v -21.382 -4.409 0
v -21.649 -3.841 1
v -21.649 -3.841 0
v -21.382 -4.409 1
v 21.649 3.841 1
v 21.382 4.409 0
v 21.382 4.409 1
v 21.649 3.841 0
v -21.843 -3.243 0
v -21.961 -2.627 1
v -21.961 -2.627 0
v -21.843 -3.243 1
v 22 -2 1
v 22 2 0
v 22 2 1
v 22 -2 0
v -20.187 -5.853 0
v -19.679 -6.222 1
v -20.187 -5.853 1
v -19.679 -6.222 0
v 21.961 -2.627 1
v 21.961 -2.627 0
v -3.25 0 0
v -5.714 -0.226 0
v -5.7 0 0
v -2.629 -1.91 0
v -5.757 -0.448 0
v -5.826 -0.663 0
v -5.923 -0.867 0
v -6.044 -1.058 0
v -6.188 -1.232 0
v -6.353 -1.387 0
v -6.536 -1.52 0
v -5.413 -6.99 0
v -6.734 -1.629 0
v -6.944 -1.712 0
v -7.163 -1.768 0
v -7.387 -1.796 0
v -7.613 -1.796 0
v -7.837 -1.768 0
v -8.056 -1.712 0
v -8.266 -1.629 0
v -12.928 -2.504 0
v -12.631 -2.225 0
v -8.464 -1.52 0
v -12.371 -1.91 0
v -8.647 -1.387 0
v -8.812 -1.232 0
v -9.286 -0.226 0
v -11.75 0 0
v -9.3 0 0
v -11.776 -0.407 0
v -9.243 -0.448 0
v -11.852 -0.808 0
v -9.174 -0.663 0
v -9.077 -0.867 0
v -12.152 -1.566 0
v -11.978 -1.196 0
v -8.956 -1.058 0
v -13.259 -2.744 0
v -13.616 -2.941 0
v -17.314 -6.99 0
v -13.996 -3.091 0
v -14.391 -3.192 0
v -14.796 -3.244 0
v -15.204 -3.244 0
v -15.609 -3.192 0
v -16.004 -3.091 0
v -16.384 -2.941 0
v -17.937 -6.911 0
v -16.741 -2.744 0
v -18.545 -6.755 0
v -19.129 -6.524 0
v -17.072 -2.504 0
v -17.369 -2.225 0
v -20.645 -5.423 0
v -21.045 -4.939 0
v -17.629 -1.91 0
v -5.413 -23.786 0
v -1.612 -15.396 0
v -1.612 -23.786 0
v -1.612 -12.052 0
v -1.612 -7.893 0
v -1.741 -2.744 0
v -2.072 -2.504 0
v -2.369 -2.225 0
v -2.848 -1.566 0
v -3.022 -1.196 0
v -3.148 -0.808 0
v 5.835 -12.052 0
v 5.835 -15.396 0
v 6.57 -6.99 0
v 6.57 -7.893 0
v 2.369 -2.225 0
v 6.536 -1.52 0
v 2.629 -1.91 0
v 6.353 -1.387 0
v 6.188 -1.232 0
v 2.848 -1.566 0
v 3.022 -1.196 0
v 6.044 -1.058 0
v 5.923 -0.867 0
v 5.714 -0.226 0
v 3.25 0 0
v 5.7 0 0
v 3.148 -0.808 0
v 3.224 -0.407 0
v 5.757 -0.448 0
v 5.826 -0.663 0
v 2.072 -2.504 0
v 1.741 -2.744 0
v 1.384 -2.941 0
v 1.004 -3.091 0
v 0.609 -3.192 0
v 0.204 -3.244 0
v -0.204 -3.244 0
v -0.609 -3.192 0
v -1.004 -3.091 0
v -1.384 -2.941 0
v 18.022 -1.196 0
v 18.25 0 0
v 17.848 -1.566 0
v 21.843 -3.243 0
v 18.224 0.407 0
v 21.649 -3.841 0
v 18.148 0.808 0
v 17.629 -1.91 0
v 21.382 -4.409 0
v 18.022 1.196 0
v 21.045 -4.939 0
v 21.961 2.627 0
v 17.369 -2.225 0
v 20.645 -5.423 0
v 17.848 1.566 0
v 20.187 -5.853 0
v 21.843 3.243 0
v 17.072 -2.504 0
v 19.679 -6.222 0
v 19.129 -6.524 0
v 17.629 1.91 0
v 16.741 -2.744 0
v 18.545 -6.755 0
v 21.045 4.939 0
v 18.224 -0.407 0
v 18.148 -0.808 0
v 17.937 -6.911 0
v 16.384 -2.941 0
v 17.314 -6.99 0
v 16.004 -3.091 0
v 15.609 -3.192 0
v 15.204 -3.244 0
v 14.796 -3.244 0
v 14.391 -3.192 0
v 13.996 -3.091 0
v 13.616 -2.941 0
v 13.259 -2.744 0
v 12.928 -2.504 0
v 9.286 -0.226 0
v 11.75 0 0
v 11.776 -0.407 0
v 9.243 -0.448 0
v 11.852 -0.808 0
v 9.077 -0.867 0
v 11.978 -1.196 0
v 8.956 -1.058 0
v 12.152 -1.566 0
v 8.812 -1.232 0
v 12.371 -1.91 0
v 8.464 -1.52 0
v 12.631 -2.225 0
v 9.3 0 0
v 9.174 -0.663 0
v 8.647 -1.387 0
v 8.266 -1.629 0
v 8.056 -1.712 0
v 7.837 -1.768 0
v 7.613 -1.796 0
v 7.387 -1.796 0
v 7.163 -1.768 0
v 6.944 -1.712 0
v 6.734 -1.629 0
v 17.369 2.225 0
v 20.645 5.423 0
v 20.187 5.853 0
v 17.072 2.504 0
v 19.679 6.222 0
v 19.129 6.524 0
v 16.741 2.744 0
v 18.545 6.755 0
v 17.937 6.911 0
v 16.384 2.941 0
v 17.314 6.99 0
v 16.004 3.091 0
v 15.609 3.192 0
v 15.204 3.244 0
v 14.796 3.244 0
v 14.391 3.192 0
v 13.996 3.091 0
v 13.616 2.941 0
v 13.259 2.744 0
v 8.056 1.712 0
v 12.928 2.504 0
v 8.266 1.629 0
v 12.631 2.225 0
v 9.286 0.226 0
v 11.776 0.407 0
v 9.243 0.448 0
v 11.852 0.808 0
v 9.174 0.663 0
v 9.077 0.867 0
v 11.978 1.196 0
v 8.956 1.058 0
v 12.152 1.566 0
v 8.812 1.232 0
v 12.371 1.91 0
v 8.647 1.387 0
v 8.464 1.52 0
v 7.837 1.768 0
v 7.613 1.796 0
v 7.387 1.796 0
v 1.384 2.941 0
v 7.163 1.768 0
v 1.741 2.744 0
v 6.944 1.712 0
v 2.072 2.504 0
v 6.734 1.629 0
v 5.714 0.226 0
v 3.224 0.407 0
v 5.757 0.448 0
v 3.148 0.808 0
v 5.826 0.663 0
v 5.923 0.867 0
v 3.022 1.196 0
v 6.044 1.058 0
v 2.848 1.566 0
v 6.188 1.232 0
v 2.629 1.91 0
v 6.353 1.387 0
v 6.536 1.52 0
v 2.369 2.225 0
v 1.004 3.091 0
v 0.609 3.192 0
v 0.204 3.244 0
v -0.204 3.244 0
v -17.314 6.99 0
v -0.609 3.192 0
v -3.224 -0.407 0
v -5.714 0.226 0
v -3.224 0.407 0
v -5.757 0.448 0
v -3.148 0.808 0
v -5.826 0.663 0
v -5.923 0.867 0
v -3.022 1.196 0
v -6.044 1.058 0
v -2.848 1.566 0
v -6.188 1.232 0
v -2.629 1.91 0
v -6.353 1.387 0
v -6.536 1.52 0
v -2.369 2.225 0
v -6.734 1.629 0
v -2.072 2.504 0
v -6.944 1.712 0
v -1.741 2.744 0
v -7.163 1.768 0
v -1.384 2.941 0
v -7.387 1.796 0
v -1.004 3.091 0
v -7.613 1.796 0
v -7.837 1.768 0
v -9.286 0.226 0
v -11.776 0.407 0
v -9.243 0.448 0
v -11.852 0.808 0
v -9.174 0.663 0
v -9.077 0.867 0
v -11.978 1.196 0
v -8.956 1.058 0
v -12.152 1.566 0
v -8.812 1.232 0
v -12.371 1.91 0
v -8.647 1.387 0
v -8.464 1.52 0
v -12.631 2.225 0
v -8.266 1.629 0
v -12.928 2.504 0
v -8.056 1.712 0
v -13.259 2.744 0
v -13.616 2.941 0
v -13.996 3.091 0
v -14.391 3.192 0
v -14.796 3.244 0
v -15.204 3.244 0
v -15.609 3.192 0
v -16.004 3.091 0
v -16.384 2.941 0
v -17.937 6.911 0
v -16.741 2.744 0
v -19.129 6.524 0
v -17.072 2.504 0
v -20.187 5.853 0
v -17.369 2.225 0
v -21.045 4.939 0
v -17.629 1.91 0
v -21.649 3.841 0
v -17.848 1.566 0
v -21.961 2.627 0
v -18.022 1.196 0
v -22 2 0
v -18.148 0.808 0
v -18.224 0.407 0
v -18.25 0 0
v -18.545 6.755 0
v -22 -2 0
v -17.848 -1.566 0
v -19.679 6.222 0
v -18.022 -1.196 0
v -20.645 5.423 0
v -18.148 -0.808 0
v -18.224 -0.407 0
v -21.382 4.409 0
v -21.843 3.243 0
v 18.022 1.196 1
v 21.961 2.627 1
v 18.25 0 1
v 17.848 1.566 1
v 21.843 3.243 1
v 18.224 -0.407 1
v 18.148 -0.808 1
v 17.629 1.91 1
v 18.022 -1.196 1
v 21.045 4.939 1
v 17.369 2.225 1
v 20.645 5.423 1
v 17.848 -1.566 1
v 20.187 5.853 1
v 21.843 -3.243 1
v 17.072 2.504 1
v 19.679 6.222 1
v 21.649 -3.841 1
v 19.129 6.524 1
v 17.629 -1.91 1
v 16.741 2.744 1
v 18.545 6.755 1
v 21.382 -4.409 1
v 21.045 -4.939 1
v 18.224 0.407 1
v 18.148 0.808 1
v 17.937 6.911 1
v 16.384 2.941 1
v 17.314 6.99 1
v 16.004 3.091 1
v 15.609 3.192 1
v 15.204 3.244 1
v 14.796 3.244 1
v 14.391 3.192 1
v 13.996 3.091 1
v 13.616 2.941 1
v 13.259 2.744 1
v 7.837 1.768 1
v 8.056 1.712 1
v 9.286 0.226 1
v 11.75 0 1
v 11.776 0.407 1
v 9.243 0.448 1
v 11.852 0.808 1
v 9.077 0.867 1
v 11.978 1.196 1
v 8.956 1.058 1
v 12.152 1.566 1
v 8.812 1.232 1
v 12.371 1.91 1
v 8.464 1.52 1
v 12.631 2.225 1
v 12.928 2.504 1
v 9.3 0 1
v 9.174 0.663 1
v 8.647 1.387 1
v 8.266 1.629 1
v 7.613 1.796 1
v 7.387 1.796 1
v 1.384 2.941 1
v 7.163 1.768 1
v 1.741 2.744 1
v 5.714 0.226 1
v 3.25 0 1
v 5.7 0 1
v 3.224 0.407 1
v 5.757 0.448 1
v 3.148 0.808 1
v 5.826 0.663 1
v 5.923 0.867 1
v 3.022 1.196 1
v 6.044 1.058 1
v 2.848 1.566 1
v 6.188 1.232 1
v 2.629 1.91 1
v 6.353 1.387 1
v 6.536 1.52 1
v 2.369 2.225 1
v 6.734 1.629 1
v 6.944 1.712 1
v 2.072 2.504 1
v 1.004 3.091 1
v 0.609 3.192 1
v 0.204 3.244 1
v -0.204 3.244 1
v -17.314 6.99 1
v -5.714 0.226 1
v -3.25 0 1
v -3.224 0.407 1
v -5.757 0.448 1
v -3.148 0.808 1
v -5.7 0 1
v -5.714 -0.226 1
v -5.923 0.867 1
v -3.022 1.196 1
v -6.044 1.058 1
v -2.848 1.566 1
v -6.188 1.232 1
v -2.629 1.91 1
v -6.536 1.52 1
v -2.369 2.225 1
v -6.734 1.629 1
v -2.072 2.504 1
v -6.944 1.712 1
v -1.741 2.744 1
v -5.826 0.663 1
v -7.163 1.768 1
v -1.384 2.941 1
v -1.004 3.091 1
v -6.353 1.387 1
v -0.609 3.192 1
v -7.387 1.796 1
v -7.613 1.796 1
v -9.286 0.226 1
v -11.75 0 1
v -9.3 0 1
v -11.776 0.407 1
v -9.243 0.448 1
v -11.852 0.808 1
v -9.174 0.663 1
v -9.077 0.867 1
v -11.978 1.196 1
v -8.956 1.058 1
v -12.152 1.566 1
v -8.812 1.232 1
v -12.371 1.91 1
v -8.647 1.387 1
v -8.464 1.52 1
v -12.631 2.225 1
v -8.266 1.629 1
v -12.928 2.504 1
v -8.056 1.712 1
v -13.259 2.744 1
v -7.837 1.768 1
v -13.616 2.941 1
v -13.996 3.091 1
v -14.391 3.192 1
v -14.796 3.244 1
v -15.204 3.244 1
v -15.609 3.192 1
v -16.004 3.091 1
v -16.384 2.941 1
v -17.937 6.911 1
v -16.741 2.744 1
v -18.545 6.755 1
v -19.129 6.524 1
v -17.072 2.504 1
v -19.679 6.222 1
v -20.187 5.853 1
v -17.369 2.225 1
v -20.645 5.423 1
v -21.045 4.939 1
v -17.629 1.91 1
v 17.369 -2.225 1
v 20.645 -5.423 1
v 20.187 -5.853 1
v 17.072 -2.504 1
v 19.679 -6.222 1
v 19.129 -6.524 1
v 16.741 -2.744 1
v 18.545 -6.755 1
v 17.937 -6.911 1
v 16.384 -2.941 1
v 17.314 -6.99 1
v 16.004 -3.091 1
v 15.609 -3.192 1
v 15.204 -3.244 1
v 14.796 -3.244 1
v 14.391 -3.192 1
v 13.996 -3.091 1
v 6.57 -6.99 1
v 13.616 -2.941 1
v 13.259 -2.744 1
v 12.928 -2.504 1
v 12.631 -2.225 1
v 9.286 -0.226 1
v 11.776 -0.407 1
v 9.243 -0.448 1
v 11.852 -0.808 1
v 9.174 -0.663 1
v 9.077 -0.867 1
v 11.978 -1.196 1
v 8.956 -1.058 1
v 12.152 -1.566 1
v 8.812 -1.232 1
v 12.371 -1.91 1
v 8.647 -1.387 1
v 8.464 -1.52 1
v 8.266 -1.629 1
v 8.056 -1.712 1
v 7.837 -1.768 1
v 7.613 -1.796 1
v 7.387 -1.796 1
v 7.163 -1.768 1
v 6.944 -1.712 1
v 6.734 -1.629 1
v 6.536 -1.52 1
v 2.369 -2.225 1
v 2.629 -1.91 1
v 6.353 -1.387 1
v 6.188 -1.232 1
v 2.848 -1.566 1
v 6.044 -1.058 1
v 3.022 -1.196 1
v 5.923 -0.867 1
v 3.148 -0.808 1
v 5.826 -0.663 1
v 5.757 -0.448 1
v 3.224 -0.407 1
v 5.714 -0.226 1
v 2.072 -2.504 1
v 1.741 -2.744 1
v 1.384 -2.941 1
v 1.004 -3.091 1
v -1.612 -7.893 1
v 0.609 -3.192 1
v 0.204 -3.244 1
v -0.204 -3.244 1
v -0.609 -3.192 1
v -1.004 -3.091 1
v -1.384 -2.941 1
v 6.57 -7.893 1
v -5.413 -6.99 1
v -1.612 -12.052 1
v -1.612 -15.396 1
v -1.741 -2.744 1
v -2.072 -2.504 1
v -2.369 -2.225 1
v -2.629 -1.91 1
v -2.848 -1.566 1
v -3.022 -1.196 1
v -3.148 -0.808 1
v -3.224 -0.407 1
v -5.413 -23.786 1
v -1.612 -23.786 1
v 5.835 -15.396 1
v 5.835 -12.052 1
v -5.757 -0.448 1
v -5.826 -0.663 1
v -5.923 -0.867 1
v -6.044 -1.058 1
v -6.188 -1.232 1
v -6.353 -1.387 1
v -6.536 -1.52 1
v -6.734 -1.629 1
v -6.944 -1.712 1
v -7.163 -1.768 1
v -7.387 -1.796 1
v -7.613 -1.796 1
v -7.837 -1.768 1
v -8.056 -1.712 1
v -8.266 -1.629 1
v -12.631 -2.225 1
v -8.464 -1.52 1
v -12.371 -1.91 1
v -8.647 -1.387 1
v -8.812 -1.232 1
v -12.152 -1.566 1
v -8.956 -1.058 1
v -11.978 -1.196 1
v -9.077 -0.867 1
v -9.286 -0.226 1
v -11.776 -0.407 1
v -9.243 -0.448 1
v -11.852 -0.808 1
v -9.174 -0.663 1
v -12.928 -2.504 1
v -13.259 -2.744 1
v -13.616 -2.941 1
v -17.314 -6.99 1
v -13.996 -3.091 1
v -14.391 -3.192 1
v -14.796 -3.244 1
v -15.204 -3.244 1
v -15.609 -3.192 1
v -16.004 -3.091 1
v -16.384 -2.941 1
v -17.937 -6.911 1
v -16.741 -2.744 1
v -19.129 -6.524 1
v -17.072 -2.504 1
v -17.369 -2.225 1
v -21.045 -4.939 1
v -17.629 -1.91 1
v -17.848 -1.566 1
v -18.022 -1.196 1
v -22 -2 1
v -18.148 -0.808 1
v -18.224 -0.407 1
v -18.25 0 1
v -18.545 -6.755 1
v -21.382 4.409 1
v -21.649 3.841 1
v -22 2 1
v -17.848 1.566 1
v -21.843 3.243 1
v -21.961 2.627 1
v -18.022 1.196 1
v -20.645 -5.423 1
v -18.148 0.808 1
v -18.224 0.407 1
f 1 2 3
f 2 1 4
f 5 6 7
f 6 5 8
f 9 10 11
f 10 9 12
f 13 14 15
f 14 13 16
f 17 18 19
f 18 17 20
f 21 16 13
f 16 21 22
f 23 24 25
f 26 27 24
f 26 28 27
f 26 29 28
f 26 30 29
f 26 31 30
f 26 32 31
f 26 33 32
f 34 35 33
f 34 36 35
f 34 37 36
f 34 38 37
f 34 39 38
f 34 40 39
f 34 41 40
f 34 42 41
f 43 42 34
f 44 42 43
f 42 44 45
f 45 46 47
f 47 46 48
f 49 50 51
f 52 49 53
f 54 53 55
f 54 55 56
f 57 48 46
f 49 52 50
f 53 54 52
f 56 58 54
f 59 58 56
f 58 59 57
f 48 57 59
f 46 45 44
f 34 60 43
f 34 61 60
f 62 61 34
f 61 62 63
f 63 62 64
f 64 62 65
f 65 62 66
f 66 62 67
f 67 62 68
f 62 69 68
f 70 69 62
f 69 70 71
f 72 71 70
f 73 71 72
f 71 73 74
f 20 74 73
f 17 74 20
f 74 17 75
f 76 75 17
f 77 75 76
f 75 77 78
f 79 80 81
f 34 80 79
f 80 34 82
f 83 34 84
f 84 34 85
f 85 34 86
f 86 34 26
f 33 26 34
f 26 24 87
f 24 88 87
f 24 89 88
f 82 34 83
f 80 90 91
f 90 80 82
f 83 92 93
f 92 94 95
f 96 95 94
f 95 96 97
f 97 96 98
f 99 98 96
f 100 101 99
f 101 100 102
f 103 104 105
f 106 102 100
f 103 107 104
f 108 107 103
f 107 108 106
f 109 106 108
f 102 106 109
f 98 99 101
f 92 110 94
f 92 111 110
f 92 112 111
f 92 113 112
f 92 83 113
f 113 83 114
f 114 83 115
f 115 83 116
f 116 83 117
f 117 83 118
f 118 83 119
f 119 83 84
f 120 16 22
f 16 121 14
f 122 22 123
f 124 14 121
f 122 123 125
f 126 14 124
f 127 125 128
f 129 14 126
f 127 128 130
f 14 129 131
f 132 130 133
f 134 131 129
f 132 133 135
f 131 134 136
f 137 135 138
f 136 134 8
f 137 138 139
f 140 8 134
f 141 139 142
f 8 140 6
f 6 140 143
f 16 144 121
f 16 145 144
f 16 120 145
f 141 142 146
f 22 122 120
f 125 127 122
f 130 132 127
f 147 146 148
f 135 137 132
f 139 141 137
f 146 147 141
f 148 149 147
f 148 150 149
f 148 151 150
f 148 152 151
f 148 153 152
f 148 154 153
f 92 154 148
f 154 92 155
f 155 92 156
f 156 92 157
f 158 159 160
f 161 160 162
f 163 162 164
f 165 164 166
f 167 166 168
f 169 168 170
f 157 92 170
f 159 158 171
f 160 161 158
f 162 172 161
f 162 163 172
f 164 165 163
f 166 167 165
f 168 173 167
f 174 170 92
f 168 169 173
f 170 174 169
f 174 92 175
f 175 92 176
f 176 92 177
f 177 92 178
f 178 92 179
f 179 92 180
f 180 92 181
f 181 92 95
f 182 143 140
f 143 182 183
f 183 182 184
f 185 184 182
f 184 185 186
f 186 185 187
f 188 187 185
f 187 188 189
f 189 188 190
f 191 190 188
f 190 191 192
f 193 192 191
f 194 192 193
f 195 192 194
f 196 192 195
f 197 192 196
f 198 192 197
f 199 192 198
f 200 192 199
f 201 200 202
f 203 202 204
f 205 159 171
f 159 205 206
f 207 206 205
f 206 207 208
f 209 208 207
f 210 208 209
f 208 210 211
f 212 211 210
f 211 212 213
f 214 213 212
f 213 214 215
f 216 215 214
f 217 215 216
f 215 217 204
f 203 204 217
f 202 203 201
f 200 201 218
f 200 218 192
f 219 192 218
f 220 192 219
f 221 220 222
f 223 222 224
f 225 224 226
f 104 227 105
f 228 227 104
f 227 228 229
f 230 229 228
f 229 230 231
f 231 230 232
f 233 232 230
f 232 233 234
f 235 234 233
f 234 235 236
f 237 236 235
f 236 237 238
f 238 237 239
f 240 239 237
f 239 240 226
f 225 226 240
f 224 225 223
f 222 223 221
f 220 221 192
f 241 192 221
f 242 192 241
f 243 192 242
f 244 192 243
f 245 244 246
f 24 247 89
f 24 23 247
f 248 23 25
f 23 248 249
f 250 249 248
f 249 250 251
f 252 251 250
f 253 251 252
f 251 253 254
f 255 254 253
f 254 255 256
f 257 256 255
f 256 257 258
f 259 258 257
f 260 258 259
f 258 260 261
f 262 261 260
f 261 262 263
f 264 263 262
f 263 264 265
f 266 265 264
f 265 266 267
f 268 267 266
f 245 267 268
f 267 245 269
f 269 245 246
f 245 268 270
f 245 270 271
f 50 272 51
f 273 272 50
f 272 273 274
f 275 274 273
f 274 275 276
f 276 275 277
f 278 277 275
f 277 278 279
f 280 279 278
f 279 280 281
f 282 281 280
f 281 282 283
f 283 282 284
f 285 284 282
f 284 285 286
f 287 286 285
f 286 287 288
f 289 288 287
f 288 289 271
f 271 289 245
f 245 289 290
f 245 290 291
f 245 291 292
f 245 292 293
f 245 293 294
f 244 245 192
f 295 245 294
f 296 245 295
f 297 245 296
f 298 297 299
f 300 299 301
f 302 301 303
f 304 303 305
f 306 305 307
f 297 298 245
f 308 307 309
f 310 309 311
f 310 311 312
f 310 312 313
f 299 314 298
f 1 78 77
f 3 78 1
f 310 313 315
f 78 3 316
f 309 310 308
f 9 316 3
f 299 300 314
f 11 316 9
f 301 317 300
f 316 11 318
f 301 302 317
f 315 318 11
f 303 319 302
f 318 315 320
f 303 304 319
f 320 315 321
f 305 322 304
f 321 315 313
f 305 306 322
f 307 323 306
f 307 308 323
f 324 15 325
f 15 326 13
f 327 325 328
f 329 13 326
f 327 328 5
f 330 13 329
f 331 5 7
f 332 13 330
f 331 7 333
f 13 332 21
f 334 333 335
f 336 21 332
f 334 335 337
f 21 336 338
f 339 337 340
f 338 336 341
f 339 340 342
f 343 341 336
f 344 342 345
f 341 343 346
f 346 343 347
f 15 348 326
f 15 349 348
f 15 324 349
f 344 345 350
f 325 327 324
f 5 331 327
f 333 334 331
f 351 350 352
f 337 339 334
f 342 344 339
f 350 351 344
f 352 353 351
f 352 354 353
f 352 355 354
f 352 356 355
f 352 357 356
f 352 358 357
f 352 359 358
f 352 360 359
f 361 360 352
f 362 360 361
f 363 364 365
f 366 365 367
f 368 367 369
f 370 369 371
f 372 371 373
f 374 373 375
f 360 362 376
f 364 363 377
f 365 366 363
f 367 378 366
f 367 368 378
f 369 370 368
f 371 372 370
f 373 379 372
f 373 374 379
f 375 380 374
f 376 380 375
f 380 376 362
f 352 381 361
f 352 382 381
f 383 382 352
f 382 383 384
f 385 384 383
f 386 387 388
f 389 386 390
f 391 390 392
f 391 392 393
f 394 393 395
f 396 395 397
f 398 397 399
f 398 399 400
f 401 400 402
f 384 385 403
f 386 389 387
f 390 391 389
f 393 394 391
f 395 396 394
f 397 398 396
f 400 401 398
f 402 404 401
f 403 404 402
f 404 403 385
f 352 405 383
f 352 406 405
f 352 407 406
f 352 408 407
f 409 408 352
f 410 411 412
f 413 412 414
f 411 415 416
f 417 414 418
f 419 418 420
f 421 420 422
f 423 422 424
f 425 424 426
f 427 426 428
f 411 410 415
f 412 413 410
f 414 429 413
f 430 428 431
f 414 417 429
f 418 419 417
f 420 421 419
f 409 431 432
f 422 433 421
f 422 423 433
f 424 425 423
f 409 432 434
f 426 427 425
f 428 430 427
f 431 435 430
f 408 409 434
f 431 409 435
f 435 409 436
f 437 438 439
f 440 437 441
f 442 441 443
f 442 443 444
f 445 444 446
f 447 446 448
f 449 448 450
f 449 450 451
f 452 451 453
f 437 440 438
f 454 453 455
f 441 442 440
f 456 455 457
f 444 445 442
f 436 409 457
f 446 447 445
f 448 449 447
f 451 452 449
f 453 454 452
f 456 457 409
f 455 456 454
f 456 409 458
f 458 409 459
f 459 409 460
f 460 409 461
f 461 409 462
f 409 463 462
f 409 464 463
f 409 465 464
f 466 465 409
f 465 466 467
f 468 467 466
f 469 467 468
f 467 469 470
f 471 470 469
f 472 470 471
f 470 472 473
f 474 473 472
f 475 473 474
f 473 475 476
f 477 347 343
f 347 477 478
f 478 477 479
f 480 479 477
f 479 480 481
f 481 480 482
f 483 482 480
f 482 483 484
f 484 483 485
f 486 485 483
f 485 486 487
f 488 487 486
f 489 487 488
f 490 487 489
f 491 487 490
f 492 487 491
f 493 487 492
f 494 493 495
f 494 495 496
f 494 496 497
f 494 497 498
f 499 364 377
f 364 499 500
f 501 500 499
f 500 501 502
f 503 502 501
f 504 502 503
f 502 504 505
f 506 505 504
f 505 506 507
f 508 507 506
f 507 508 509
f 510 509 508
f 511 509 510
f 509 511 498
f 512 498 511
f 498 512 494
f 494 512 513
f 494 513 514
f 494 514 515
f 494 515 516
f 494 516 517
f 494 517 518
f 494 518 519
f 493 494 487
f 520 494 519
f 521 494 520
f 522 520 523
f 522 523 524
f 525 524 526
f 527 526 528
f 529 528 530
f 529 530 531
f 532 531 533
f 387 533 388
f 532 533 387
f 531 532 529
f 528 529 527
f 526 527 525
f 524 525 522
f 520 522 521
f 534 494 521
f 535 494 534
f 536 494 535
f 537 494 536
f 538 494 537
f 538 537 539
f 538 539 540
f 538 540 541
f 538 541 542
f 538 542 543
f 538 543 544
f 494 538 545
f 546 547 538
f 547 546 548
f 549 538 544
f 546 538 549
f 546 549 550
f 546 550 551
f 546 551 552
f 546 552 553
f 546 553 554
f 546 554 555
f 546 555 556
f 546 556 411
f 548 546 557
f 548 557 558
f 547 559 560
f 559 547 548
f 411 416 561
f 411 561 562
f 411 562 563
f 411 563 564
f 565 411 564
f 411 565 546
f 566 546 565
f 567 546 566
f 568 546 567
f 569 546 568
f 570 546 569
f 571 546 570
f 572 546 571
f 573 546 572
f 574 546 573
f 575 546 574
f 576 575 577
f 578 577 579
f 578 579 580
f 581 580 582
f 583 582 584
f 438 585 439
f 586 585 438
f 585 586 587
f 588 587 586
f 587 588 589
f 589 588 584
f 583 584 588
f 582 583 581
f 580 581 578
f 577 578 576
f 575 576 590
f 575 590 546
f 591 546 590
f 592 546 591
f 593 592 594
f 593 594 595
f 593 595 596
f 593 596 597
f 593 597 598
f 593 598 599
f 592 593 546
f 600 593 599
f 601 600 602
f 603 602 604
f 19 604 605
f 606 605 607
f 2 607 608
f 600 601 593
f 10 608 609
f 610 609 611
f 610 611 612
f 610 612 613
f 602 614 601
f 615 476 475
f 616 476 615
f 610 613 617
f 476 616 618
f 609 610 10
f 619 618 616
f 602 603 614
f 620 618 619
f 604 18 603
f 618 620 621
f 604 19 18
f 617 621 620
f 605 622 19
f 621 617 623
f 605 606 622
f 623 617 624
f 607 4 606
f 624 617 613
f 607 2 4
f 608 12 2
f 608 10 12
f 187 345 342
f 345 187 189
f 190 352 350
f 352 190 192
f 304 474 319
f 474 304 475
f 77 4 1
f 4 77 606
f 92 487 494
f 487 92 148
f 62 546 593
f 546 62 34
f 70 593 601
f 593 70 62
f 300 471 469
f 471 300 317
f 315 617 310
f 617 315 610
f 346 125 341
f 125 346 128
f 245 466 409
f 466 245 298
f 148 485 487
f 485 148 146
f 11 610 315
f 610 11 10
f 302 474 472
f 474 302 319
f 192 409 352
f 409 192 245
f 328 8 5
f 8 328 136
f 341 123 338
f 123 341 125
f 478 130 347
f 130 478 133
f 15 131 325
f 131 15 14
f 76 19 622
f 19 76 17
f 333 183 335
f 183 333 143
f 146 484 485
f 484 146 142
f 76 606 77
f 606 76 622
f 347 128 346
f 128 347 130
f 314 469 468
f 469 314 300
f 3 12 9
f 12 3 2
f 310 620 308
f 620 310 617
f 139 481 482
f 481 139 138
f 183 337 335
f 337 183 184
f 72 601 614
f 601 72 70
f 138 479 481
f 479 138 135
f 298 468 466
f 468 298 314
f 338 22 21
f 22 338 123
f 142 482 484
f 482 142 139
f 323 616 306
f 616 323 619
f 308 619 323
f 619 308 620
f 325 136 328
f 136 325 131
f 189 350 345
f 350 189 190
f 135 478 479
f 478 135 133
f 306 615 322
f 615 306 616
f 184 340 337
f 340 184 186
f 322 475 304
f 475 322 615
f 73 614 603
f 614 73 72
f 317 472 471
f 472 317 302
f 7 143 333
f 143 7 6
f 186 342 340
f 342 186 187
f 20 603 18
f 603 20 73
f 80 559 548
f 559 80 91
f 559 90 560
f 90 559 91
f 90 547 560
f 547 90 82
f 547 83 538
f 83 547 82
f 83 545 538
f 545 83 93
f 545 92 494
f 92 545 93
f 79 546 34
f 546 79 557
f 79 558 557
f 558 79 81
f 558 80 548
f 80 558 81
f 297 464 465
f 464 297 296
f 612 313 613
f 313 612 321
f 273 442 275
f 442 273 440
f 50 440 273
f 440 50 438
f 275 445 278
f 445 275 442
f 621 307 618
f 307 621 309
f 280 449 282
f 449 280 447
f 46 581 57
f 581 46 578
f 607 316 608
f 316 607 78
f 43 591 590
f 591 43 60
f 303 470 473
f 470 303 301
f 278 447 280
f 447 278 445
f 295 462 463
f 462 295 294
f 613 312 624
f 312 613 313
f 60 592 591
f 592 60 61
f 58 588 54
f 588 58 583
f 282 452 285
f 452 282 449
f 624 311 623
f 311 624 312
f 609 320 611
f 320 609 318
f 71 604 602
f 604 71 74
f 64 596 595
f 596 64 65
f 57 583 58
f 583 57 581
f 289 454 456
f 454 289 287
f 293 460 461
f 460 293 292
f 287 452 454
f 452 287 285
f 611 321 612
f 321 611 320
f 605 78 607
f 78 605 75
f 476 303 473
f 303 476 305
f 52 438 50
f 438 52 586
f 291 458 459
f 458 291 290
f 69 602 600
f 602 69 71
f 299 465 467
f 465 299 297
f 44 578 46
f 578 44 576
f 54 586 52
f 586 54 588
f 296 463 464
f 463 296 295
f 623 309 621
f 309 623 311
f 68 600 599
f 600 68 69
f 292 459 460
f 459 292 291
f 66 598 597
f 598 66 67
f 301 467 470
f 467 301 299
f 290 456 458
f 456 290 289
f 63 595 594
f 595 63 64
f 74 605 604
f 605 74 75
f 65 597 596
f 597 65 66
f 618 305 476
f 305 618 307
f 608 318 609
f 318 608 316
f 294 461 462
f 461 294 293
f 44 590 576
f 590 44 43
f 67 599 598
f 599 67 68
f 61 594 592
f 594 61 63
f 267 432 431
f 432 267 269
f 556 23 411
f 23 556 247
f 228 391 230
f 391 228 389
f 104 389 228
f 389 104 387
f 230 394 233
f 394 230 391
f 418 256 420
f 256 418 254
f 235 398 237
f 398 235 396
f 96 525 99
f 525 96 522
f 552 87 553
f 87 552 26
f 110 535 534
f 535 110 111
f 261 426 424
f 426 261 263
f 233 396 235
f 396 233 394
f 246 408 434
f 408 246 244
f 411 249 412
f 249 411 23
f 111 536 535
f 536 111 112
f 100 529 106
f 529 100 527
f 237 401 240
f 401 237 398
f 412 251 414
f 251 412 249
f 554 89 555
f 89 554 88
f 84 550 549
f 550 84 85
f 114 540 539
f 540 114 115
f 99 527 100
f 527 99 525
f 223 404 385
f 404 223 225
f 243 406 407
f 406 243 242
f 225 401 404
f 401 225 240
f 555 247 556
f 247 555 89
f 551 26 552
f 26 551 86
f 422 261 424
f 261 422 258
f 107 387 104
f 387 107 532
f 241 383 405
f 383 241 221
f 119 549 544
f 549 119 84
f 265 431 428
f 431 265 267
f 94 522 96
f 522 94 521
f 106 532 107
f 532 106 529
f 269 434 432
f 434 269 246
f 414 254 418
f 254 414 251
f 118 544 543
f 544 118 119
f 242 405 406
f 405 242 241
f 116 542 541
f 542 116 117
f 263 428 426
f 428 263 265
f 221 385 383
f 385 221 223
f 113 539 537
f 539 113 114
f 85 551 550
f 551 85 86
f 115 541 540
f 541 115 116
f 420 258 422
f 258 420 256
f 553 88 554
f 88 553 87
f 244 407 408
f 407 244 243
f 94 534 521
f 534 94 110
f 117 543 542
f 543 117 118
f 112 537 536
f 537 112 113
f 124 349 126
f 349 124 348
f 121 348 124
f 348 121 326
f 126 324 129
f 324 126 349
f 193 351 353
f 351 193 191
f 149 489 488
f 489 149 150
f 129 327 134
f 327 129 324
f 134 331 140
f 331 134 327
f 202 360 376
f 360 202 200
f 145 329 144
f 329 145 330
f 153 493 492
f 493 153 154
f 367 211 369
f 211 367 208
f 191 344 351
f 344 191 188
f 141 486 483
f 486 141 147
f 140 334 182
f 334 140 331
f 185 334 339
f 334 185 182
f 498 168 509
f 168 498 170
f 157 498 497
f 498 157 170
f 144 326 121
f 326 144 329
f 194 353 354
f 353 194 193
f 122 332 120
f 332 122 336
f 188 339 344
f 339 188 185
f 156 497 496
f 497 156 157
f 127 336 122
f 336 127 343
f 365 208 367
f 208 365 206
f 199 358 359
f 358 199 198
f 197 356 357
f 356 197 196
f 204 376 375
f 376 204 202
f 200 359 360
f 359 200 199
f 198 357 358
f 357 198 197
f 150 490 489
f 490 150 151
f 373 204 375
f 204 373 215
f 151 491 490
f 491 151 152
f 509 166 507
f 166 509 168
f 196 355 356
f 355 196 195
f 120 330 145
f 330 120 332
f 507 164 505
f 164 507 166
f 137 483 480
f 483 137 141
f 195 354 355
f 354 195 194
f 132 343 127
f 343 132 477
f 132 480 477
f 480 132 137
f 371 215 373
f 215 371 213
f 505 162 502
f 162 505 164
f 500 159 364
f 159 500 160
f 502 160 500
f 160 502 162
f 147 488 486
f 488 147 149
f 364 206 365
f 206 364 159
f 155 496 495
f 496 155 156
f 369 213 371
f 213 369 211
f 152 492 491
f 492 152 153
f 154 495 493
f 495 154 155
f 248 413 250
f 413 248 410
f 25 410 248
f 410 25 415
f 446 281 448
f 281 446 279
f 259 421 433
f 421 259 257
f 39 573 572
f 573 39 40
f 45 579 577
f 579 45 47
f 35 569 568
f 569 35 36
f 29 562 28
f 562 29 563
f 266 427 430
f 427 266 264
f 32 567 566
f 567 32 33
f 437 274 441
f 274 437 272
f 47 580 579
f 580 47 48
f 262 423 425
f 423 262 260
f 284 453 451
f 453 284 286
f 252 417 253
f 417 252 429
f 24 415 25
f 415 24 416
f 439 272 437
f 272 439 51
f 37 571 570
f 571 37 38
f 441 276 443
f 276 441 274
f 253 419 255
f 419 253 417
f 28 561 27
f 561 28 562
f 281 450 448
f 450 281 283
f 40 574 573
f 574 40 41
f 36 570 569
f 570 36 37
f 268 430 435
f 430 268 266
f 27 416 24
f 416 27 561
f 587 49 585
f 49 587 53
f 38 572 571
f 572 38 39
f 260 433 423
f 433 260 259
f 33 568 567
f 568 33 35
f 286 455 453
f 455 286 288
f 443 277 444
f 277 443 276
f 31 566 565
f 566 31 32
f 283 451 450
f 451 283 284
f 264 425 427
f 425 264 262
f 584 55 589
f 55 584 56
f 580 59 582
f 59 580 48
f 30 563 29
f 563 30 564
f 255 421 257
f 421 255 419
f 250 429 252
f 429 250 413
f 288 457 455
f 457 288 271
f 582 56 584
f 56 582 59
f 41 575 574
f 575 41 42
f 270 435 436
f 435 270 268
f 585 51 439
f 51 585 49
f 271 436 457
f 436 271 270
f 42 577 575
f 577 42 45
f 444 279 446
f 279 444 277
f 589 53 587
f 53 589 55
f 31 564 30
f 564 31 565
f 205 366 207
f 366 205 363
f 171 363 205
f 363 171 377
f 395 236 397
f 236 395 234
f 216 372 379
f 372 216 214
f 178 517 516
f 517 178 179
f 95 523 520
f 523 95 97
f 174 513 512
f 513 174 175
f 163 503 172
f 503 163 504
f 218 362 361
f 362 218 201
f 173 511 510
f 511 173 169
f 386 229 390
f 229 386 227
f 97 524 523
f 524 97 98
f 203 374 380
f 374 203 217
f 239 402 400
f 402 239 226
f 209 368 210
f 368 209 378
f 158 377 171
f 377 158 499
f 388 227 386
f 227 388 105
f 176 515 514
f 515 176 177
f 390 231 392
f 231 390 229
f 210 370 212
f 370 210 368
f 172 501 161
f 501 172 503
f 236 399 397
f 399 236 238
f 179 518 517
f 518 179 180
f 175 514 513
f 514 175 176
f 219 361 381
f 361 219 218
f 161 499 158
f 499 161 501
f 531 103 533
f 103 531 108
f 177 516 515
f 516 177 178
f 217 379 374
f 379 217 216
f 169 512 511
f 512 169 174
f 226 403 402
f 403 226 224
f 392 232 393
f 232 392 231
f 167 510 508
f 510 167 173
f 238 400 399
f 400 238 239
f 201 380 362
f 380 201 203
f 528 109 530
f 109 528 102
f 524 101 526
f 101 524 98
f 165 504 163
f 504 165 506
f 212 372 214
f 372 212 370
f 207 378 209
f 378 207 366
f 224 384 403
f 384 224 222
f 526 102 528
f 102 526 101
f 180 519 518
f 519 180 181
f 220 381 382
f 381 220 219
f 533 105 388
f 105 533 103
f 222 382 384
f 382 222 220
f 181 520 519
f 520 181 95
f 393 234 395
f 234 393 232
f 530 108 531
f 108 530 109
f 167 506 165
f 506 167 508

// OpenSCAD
$fn = 50;


difference() {
	union() {
		*color(alpha = 1.0000000000, c = "gray") {
			translate(v = [0, 14, 0]) {
				linear_extrude(height = 1) {
					text(font = "Arial:style=Bold", halign = "center", size = 4.5000000000, text = "COMMENT description oobb_plate_shape_p_type_1_depth_3_width_1_thickness_f_extra_oobb_size", valign = "center");
				}
			}
		}
		hull() {
			translate(v = [-17.0000000000, 2.0000000000, 0]) {
				cylinder(h = 1, r = 5);
			}
			translate(v = [17.0000000000, 2.0000000000, 0]) {
				cylinder(h = 1, r = 5);
			}
			translate(v = [-17.0000000000, -2.0000000000, 0]) {
				cylinder(h = 1, r = 5);
			}
			translate(v = [17.0000000000, -2.0000000000, 0]) {
				cylinder(h = 1, r = 5);
			}
		}
		translate(v = [0, -5, 0]) {
			linear_extrude(height = 1) {
				text(font = "DejaVu Sans Mono:style=Bold", halign = "center", size = 19.0000000000, text = "F", valign = "top");
			}
		}
	}
	union() {
		*color(alpha = 1.0000000000, c = "gray") {
			translate(v = [0, 14, 0]) {
				linear_extrude(height = 1) {
					text(font = "Arial:style=Bold", halign = "center", size = 4.5000000000, text = "COMMENT description oobb_holes_shape_n_type_3_width_1_thickness_f_extra_oobb_size_1_height_'all'_holes_true_both_holes", valign = "center");
				}
			}
		}
		translate(v = [-15.0000000000, 0.0000000000, 0]) {
			translate(v = [0, 0, -50]) {
				cylinder(h = 100, r = 3.2500000000);
			}
		}
		translate(v = [0, 0, -50]) {
			cylinder(h = 100, r = 3.2500000000);
		}
		translate(v = [15.0000000000, 0.0000000000, 0]) {
			translate(v = [0, 0, -50]) {
				cylinder(h = 100, r = 3.2500000000);
			}
		}
		translate(v = [-15.0000000000, 0.0000000000, 0]) {
			translate(v = [0, 0, -50]) {
				cylinder(h = 100, r = 1.8000000000);
			}
		}
		translate(v = [-7.5000000000, 0.0000000000, 0]) {
			translate(v = [0, 0, -50]) {
				cylinder(h = 100, r = 1.8000000000);
			}
		}
		translate(v = [0, 0, -50]) {
			cylinder(h = 100, r = 1.8000000000);
		}
		translate(v = [7.5000000000, 0.0000000000, 0]) {
			translate(v = [0, 0, -50]) {
				cylinder(h = 100, r = 1.8000000000);
			}
		}
		translate(v = [15.0000000000, 0.0000000000, 0]) {
			translate(v = [0, 0, -50]) {
				cylinder(h = 100, r = 1.8000000000);
			}
		}
	}
}
